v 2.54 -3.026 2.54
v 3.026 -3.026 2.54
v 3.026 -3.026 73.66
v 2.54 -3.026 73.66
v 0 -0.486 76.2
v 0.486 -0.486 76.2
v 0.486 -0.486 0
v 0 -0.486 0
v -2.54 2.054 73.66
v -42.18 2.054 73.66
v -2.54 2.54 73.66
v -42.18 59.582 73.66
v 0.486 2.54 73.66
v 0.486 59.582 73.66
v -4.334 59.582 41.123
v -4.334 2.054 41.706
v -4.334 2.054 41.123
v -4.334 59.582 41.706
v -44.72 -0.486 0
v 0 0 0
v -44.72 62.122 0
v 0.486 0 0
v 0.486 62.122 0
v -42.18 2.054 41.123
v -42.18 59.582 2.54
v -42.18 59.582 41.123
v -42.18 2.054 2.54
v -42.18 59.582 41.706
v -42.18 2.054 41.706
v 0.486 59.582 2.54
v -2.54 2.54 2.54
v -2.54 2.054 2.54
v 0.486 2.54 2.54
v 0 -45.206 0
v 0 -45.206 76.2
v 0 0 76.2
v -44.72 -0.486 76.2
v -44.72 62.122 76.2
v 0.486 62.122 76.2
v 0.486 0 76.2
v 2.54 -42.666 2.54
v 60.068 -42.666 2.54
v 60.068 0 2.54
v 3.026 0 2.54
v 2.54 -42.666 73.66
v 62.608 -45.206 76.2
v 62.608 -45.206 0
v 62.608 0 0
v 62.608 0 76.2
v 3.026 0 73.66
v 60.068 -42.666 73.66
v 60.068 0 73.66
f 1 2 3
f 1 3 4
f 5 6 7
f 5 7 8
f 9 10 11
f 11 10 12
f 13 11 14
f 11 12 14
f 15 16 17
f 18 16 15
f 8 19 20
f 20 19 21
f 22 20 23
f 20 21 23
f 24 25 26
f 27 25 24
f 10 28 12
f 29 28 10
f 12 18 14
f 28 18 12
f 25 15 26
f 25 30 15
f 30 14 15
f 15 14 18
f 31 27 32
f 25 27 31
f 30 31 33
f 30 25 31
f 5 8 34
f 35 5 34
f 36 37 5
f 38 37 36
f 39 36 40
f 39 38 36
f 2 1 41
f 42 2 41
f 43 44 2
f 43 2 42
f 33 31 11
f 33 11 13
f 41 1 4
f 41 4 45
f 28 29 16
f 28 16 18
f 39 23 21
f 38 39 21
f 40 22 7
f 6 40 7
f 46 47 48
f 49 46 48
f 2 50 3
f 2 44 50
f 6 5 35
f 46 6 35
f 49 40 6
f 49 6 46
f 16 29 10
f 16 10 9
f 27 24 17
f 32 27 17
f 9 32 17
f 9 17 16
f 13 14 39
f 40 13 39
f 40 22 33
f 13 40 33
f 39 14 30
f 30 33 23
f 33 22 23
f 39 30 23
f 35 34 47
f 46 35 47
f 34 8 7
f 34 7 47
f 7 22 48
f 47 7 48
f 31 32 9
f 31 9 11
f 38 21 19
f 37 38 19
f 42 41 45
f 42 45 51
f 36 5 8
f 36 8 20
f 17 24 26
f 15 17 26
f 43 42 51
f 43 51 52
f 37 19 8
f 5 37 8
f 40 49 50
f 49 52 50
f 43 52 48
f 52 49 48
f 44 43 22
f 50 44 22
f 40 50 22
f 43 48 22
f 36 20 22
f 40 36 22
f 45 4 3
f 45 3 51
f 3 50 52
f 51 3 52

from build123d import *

# Parameters (mm, degrees)
F1_DEPTH = 76.2
F2_T     = -2.54
F3_T     = -2.54
F4_W     = 57.5280706716
F4_H     = 0.5833022296
F5_DEPTH = 37.846


# Not quite as in the source:
# - the program builds the solid bodies; features that only make, move or delete a surface that nothing else refers to are left out


with BuildPart() as f1:
    # F0 (on Top) → F1 (new body)
    with BuildSketch(Plane.XY):
        Polygon((0, -0.486087054), (0, 0), (0.4860870778, 0), (0.4860901141, 62.1219835938), (-44.7200468874, 62.1219858033), (-44.7200499475, -0.4860848683), align=None)
    extrude(amount=F1_DEPTH)

    # F2
    f2_openings = [f1.faces().sort_by_distance(p)[0] for p in [
        (0.486089, 31.060992, 38.1),
    ]]
    offset(amount=F2_T, openings=f2_openings, kind=Kind.INTERSECTION)

    # F4 (on face) → F5 (join)
    with BuildSketch(Plane(origin=(-42.1800499237, 2.0616e-06, 0), x_dir=(4.89e-08, 1, 0), z_dir=(1, -4.89e-08, 0))):
        with Locations((30.8179482818, 41.4146538824)):
            Rectangle(F4_W, F4_H)
    extrude(amount=F5_DEPTH)


with BuildPart() as f1b:
    # F0 (on Top) → F1, piece 2 (new body)
    with BuildSketch(Plane.XY):
        Polygon((62.6080706716, 0), (0.4860870778, 0), (0.486087054, -0.4860870778), (0, -0.486087054), (0, -45.2061370015), (62.6080706716, -45.2061370015), align=None)
    extrude(amount=F1_DEPTH)

    # F3
    f3_openings = [f1b.faces().sort_by_distance(p)[0] for p in [
        (31.547079, 0, 38.1),
    ]]
    offset(amount=F3_T, openings=f3_openings, kind=Kind.INTERSECTION)


solid = Compound([f1.part, f1b.part])
